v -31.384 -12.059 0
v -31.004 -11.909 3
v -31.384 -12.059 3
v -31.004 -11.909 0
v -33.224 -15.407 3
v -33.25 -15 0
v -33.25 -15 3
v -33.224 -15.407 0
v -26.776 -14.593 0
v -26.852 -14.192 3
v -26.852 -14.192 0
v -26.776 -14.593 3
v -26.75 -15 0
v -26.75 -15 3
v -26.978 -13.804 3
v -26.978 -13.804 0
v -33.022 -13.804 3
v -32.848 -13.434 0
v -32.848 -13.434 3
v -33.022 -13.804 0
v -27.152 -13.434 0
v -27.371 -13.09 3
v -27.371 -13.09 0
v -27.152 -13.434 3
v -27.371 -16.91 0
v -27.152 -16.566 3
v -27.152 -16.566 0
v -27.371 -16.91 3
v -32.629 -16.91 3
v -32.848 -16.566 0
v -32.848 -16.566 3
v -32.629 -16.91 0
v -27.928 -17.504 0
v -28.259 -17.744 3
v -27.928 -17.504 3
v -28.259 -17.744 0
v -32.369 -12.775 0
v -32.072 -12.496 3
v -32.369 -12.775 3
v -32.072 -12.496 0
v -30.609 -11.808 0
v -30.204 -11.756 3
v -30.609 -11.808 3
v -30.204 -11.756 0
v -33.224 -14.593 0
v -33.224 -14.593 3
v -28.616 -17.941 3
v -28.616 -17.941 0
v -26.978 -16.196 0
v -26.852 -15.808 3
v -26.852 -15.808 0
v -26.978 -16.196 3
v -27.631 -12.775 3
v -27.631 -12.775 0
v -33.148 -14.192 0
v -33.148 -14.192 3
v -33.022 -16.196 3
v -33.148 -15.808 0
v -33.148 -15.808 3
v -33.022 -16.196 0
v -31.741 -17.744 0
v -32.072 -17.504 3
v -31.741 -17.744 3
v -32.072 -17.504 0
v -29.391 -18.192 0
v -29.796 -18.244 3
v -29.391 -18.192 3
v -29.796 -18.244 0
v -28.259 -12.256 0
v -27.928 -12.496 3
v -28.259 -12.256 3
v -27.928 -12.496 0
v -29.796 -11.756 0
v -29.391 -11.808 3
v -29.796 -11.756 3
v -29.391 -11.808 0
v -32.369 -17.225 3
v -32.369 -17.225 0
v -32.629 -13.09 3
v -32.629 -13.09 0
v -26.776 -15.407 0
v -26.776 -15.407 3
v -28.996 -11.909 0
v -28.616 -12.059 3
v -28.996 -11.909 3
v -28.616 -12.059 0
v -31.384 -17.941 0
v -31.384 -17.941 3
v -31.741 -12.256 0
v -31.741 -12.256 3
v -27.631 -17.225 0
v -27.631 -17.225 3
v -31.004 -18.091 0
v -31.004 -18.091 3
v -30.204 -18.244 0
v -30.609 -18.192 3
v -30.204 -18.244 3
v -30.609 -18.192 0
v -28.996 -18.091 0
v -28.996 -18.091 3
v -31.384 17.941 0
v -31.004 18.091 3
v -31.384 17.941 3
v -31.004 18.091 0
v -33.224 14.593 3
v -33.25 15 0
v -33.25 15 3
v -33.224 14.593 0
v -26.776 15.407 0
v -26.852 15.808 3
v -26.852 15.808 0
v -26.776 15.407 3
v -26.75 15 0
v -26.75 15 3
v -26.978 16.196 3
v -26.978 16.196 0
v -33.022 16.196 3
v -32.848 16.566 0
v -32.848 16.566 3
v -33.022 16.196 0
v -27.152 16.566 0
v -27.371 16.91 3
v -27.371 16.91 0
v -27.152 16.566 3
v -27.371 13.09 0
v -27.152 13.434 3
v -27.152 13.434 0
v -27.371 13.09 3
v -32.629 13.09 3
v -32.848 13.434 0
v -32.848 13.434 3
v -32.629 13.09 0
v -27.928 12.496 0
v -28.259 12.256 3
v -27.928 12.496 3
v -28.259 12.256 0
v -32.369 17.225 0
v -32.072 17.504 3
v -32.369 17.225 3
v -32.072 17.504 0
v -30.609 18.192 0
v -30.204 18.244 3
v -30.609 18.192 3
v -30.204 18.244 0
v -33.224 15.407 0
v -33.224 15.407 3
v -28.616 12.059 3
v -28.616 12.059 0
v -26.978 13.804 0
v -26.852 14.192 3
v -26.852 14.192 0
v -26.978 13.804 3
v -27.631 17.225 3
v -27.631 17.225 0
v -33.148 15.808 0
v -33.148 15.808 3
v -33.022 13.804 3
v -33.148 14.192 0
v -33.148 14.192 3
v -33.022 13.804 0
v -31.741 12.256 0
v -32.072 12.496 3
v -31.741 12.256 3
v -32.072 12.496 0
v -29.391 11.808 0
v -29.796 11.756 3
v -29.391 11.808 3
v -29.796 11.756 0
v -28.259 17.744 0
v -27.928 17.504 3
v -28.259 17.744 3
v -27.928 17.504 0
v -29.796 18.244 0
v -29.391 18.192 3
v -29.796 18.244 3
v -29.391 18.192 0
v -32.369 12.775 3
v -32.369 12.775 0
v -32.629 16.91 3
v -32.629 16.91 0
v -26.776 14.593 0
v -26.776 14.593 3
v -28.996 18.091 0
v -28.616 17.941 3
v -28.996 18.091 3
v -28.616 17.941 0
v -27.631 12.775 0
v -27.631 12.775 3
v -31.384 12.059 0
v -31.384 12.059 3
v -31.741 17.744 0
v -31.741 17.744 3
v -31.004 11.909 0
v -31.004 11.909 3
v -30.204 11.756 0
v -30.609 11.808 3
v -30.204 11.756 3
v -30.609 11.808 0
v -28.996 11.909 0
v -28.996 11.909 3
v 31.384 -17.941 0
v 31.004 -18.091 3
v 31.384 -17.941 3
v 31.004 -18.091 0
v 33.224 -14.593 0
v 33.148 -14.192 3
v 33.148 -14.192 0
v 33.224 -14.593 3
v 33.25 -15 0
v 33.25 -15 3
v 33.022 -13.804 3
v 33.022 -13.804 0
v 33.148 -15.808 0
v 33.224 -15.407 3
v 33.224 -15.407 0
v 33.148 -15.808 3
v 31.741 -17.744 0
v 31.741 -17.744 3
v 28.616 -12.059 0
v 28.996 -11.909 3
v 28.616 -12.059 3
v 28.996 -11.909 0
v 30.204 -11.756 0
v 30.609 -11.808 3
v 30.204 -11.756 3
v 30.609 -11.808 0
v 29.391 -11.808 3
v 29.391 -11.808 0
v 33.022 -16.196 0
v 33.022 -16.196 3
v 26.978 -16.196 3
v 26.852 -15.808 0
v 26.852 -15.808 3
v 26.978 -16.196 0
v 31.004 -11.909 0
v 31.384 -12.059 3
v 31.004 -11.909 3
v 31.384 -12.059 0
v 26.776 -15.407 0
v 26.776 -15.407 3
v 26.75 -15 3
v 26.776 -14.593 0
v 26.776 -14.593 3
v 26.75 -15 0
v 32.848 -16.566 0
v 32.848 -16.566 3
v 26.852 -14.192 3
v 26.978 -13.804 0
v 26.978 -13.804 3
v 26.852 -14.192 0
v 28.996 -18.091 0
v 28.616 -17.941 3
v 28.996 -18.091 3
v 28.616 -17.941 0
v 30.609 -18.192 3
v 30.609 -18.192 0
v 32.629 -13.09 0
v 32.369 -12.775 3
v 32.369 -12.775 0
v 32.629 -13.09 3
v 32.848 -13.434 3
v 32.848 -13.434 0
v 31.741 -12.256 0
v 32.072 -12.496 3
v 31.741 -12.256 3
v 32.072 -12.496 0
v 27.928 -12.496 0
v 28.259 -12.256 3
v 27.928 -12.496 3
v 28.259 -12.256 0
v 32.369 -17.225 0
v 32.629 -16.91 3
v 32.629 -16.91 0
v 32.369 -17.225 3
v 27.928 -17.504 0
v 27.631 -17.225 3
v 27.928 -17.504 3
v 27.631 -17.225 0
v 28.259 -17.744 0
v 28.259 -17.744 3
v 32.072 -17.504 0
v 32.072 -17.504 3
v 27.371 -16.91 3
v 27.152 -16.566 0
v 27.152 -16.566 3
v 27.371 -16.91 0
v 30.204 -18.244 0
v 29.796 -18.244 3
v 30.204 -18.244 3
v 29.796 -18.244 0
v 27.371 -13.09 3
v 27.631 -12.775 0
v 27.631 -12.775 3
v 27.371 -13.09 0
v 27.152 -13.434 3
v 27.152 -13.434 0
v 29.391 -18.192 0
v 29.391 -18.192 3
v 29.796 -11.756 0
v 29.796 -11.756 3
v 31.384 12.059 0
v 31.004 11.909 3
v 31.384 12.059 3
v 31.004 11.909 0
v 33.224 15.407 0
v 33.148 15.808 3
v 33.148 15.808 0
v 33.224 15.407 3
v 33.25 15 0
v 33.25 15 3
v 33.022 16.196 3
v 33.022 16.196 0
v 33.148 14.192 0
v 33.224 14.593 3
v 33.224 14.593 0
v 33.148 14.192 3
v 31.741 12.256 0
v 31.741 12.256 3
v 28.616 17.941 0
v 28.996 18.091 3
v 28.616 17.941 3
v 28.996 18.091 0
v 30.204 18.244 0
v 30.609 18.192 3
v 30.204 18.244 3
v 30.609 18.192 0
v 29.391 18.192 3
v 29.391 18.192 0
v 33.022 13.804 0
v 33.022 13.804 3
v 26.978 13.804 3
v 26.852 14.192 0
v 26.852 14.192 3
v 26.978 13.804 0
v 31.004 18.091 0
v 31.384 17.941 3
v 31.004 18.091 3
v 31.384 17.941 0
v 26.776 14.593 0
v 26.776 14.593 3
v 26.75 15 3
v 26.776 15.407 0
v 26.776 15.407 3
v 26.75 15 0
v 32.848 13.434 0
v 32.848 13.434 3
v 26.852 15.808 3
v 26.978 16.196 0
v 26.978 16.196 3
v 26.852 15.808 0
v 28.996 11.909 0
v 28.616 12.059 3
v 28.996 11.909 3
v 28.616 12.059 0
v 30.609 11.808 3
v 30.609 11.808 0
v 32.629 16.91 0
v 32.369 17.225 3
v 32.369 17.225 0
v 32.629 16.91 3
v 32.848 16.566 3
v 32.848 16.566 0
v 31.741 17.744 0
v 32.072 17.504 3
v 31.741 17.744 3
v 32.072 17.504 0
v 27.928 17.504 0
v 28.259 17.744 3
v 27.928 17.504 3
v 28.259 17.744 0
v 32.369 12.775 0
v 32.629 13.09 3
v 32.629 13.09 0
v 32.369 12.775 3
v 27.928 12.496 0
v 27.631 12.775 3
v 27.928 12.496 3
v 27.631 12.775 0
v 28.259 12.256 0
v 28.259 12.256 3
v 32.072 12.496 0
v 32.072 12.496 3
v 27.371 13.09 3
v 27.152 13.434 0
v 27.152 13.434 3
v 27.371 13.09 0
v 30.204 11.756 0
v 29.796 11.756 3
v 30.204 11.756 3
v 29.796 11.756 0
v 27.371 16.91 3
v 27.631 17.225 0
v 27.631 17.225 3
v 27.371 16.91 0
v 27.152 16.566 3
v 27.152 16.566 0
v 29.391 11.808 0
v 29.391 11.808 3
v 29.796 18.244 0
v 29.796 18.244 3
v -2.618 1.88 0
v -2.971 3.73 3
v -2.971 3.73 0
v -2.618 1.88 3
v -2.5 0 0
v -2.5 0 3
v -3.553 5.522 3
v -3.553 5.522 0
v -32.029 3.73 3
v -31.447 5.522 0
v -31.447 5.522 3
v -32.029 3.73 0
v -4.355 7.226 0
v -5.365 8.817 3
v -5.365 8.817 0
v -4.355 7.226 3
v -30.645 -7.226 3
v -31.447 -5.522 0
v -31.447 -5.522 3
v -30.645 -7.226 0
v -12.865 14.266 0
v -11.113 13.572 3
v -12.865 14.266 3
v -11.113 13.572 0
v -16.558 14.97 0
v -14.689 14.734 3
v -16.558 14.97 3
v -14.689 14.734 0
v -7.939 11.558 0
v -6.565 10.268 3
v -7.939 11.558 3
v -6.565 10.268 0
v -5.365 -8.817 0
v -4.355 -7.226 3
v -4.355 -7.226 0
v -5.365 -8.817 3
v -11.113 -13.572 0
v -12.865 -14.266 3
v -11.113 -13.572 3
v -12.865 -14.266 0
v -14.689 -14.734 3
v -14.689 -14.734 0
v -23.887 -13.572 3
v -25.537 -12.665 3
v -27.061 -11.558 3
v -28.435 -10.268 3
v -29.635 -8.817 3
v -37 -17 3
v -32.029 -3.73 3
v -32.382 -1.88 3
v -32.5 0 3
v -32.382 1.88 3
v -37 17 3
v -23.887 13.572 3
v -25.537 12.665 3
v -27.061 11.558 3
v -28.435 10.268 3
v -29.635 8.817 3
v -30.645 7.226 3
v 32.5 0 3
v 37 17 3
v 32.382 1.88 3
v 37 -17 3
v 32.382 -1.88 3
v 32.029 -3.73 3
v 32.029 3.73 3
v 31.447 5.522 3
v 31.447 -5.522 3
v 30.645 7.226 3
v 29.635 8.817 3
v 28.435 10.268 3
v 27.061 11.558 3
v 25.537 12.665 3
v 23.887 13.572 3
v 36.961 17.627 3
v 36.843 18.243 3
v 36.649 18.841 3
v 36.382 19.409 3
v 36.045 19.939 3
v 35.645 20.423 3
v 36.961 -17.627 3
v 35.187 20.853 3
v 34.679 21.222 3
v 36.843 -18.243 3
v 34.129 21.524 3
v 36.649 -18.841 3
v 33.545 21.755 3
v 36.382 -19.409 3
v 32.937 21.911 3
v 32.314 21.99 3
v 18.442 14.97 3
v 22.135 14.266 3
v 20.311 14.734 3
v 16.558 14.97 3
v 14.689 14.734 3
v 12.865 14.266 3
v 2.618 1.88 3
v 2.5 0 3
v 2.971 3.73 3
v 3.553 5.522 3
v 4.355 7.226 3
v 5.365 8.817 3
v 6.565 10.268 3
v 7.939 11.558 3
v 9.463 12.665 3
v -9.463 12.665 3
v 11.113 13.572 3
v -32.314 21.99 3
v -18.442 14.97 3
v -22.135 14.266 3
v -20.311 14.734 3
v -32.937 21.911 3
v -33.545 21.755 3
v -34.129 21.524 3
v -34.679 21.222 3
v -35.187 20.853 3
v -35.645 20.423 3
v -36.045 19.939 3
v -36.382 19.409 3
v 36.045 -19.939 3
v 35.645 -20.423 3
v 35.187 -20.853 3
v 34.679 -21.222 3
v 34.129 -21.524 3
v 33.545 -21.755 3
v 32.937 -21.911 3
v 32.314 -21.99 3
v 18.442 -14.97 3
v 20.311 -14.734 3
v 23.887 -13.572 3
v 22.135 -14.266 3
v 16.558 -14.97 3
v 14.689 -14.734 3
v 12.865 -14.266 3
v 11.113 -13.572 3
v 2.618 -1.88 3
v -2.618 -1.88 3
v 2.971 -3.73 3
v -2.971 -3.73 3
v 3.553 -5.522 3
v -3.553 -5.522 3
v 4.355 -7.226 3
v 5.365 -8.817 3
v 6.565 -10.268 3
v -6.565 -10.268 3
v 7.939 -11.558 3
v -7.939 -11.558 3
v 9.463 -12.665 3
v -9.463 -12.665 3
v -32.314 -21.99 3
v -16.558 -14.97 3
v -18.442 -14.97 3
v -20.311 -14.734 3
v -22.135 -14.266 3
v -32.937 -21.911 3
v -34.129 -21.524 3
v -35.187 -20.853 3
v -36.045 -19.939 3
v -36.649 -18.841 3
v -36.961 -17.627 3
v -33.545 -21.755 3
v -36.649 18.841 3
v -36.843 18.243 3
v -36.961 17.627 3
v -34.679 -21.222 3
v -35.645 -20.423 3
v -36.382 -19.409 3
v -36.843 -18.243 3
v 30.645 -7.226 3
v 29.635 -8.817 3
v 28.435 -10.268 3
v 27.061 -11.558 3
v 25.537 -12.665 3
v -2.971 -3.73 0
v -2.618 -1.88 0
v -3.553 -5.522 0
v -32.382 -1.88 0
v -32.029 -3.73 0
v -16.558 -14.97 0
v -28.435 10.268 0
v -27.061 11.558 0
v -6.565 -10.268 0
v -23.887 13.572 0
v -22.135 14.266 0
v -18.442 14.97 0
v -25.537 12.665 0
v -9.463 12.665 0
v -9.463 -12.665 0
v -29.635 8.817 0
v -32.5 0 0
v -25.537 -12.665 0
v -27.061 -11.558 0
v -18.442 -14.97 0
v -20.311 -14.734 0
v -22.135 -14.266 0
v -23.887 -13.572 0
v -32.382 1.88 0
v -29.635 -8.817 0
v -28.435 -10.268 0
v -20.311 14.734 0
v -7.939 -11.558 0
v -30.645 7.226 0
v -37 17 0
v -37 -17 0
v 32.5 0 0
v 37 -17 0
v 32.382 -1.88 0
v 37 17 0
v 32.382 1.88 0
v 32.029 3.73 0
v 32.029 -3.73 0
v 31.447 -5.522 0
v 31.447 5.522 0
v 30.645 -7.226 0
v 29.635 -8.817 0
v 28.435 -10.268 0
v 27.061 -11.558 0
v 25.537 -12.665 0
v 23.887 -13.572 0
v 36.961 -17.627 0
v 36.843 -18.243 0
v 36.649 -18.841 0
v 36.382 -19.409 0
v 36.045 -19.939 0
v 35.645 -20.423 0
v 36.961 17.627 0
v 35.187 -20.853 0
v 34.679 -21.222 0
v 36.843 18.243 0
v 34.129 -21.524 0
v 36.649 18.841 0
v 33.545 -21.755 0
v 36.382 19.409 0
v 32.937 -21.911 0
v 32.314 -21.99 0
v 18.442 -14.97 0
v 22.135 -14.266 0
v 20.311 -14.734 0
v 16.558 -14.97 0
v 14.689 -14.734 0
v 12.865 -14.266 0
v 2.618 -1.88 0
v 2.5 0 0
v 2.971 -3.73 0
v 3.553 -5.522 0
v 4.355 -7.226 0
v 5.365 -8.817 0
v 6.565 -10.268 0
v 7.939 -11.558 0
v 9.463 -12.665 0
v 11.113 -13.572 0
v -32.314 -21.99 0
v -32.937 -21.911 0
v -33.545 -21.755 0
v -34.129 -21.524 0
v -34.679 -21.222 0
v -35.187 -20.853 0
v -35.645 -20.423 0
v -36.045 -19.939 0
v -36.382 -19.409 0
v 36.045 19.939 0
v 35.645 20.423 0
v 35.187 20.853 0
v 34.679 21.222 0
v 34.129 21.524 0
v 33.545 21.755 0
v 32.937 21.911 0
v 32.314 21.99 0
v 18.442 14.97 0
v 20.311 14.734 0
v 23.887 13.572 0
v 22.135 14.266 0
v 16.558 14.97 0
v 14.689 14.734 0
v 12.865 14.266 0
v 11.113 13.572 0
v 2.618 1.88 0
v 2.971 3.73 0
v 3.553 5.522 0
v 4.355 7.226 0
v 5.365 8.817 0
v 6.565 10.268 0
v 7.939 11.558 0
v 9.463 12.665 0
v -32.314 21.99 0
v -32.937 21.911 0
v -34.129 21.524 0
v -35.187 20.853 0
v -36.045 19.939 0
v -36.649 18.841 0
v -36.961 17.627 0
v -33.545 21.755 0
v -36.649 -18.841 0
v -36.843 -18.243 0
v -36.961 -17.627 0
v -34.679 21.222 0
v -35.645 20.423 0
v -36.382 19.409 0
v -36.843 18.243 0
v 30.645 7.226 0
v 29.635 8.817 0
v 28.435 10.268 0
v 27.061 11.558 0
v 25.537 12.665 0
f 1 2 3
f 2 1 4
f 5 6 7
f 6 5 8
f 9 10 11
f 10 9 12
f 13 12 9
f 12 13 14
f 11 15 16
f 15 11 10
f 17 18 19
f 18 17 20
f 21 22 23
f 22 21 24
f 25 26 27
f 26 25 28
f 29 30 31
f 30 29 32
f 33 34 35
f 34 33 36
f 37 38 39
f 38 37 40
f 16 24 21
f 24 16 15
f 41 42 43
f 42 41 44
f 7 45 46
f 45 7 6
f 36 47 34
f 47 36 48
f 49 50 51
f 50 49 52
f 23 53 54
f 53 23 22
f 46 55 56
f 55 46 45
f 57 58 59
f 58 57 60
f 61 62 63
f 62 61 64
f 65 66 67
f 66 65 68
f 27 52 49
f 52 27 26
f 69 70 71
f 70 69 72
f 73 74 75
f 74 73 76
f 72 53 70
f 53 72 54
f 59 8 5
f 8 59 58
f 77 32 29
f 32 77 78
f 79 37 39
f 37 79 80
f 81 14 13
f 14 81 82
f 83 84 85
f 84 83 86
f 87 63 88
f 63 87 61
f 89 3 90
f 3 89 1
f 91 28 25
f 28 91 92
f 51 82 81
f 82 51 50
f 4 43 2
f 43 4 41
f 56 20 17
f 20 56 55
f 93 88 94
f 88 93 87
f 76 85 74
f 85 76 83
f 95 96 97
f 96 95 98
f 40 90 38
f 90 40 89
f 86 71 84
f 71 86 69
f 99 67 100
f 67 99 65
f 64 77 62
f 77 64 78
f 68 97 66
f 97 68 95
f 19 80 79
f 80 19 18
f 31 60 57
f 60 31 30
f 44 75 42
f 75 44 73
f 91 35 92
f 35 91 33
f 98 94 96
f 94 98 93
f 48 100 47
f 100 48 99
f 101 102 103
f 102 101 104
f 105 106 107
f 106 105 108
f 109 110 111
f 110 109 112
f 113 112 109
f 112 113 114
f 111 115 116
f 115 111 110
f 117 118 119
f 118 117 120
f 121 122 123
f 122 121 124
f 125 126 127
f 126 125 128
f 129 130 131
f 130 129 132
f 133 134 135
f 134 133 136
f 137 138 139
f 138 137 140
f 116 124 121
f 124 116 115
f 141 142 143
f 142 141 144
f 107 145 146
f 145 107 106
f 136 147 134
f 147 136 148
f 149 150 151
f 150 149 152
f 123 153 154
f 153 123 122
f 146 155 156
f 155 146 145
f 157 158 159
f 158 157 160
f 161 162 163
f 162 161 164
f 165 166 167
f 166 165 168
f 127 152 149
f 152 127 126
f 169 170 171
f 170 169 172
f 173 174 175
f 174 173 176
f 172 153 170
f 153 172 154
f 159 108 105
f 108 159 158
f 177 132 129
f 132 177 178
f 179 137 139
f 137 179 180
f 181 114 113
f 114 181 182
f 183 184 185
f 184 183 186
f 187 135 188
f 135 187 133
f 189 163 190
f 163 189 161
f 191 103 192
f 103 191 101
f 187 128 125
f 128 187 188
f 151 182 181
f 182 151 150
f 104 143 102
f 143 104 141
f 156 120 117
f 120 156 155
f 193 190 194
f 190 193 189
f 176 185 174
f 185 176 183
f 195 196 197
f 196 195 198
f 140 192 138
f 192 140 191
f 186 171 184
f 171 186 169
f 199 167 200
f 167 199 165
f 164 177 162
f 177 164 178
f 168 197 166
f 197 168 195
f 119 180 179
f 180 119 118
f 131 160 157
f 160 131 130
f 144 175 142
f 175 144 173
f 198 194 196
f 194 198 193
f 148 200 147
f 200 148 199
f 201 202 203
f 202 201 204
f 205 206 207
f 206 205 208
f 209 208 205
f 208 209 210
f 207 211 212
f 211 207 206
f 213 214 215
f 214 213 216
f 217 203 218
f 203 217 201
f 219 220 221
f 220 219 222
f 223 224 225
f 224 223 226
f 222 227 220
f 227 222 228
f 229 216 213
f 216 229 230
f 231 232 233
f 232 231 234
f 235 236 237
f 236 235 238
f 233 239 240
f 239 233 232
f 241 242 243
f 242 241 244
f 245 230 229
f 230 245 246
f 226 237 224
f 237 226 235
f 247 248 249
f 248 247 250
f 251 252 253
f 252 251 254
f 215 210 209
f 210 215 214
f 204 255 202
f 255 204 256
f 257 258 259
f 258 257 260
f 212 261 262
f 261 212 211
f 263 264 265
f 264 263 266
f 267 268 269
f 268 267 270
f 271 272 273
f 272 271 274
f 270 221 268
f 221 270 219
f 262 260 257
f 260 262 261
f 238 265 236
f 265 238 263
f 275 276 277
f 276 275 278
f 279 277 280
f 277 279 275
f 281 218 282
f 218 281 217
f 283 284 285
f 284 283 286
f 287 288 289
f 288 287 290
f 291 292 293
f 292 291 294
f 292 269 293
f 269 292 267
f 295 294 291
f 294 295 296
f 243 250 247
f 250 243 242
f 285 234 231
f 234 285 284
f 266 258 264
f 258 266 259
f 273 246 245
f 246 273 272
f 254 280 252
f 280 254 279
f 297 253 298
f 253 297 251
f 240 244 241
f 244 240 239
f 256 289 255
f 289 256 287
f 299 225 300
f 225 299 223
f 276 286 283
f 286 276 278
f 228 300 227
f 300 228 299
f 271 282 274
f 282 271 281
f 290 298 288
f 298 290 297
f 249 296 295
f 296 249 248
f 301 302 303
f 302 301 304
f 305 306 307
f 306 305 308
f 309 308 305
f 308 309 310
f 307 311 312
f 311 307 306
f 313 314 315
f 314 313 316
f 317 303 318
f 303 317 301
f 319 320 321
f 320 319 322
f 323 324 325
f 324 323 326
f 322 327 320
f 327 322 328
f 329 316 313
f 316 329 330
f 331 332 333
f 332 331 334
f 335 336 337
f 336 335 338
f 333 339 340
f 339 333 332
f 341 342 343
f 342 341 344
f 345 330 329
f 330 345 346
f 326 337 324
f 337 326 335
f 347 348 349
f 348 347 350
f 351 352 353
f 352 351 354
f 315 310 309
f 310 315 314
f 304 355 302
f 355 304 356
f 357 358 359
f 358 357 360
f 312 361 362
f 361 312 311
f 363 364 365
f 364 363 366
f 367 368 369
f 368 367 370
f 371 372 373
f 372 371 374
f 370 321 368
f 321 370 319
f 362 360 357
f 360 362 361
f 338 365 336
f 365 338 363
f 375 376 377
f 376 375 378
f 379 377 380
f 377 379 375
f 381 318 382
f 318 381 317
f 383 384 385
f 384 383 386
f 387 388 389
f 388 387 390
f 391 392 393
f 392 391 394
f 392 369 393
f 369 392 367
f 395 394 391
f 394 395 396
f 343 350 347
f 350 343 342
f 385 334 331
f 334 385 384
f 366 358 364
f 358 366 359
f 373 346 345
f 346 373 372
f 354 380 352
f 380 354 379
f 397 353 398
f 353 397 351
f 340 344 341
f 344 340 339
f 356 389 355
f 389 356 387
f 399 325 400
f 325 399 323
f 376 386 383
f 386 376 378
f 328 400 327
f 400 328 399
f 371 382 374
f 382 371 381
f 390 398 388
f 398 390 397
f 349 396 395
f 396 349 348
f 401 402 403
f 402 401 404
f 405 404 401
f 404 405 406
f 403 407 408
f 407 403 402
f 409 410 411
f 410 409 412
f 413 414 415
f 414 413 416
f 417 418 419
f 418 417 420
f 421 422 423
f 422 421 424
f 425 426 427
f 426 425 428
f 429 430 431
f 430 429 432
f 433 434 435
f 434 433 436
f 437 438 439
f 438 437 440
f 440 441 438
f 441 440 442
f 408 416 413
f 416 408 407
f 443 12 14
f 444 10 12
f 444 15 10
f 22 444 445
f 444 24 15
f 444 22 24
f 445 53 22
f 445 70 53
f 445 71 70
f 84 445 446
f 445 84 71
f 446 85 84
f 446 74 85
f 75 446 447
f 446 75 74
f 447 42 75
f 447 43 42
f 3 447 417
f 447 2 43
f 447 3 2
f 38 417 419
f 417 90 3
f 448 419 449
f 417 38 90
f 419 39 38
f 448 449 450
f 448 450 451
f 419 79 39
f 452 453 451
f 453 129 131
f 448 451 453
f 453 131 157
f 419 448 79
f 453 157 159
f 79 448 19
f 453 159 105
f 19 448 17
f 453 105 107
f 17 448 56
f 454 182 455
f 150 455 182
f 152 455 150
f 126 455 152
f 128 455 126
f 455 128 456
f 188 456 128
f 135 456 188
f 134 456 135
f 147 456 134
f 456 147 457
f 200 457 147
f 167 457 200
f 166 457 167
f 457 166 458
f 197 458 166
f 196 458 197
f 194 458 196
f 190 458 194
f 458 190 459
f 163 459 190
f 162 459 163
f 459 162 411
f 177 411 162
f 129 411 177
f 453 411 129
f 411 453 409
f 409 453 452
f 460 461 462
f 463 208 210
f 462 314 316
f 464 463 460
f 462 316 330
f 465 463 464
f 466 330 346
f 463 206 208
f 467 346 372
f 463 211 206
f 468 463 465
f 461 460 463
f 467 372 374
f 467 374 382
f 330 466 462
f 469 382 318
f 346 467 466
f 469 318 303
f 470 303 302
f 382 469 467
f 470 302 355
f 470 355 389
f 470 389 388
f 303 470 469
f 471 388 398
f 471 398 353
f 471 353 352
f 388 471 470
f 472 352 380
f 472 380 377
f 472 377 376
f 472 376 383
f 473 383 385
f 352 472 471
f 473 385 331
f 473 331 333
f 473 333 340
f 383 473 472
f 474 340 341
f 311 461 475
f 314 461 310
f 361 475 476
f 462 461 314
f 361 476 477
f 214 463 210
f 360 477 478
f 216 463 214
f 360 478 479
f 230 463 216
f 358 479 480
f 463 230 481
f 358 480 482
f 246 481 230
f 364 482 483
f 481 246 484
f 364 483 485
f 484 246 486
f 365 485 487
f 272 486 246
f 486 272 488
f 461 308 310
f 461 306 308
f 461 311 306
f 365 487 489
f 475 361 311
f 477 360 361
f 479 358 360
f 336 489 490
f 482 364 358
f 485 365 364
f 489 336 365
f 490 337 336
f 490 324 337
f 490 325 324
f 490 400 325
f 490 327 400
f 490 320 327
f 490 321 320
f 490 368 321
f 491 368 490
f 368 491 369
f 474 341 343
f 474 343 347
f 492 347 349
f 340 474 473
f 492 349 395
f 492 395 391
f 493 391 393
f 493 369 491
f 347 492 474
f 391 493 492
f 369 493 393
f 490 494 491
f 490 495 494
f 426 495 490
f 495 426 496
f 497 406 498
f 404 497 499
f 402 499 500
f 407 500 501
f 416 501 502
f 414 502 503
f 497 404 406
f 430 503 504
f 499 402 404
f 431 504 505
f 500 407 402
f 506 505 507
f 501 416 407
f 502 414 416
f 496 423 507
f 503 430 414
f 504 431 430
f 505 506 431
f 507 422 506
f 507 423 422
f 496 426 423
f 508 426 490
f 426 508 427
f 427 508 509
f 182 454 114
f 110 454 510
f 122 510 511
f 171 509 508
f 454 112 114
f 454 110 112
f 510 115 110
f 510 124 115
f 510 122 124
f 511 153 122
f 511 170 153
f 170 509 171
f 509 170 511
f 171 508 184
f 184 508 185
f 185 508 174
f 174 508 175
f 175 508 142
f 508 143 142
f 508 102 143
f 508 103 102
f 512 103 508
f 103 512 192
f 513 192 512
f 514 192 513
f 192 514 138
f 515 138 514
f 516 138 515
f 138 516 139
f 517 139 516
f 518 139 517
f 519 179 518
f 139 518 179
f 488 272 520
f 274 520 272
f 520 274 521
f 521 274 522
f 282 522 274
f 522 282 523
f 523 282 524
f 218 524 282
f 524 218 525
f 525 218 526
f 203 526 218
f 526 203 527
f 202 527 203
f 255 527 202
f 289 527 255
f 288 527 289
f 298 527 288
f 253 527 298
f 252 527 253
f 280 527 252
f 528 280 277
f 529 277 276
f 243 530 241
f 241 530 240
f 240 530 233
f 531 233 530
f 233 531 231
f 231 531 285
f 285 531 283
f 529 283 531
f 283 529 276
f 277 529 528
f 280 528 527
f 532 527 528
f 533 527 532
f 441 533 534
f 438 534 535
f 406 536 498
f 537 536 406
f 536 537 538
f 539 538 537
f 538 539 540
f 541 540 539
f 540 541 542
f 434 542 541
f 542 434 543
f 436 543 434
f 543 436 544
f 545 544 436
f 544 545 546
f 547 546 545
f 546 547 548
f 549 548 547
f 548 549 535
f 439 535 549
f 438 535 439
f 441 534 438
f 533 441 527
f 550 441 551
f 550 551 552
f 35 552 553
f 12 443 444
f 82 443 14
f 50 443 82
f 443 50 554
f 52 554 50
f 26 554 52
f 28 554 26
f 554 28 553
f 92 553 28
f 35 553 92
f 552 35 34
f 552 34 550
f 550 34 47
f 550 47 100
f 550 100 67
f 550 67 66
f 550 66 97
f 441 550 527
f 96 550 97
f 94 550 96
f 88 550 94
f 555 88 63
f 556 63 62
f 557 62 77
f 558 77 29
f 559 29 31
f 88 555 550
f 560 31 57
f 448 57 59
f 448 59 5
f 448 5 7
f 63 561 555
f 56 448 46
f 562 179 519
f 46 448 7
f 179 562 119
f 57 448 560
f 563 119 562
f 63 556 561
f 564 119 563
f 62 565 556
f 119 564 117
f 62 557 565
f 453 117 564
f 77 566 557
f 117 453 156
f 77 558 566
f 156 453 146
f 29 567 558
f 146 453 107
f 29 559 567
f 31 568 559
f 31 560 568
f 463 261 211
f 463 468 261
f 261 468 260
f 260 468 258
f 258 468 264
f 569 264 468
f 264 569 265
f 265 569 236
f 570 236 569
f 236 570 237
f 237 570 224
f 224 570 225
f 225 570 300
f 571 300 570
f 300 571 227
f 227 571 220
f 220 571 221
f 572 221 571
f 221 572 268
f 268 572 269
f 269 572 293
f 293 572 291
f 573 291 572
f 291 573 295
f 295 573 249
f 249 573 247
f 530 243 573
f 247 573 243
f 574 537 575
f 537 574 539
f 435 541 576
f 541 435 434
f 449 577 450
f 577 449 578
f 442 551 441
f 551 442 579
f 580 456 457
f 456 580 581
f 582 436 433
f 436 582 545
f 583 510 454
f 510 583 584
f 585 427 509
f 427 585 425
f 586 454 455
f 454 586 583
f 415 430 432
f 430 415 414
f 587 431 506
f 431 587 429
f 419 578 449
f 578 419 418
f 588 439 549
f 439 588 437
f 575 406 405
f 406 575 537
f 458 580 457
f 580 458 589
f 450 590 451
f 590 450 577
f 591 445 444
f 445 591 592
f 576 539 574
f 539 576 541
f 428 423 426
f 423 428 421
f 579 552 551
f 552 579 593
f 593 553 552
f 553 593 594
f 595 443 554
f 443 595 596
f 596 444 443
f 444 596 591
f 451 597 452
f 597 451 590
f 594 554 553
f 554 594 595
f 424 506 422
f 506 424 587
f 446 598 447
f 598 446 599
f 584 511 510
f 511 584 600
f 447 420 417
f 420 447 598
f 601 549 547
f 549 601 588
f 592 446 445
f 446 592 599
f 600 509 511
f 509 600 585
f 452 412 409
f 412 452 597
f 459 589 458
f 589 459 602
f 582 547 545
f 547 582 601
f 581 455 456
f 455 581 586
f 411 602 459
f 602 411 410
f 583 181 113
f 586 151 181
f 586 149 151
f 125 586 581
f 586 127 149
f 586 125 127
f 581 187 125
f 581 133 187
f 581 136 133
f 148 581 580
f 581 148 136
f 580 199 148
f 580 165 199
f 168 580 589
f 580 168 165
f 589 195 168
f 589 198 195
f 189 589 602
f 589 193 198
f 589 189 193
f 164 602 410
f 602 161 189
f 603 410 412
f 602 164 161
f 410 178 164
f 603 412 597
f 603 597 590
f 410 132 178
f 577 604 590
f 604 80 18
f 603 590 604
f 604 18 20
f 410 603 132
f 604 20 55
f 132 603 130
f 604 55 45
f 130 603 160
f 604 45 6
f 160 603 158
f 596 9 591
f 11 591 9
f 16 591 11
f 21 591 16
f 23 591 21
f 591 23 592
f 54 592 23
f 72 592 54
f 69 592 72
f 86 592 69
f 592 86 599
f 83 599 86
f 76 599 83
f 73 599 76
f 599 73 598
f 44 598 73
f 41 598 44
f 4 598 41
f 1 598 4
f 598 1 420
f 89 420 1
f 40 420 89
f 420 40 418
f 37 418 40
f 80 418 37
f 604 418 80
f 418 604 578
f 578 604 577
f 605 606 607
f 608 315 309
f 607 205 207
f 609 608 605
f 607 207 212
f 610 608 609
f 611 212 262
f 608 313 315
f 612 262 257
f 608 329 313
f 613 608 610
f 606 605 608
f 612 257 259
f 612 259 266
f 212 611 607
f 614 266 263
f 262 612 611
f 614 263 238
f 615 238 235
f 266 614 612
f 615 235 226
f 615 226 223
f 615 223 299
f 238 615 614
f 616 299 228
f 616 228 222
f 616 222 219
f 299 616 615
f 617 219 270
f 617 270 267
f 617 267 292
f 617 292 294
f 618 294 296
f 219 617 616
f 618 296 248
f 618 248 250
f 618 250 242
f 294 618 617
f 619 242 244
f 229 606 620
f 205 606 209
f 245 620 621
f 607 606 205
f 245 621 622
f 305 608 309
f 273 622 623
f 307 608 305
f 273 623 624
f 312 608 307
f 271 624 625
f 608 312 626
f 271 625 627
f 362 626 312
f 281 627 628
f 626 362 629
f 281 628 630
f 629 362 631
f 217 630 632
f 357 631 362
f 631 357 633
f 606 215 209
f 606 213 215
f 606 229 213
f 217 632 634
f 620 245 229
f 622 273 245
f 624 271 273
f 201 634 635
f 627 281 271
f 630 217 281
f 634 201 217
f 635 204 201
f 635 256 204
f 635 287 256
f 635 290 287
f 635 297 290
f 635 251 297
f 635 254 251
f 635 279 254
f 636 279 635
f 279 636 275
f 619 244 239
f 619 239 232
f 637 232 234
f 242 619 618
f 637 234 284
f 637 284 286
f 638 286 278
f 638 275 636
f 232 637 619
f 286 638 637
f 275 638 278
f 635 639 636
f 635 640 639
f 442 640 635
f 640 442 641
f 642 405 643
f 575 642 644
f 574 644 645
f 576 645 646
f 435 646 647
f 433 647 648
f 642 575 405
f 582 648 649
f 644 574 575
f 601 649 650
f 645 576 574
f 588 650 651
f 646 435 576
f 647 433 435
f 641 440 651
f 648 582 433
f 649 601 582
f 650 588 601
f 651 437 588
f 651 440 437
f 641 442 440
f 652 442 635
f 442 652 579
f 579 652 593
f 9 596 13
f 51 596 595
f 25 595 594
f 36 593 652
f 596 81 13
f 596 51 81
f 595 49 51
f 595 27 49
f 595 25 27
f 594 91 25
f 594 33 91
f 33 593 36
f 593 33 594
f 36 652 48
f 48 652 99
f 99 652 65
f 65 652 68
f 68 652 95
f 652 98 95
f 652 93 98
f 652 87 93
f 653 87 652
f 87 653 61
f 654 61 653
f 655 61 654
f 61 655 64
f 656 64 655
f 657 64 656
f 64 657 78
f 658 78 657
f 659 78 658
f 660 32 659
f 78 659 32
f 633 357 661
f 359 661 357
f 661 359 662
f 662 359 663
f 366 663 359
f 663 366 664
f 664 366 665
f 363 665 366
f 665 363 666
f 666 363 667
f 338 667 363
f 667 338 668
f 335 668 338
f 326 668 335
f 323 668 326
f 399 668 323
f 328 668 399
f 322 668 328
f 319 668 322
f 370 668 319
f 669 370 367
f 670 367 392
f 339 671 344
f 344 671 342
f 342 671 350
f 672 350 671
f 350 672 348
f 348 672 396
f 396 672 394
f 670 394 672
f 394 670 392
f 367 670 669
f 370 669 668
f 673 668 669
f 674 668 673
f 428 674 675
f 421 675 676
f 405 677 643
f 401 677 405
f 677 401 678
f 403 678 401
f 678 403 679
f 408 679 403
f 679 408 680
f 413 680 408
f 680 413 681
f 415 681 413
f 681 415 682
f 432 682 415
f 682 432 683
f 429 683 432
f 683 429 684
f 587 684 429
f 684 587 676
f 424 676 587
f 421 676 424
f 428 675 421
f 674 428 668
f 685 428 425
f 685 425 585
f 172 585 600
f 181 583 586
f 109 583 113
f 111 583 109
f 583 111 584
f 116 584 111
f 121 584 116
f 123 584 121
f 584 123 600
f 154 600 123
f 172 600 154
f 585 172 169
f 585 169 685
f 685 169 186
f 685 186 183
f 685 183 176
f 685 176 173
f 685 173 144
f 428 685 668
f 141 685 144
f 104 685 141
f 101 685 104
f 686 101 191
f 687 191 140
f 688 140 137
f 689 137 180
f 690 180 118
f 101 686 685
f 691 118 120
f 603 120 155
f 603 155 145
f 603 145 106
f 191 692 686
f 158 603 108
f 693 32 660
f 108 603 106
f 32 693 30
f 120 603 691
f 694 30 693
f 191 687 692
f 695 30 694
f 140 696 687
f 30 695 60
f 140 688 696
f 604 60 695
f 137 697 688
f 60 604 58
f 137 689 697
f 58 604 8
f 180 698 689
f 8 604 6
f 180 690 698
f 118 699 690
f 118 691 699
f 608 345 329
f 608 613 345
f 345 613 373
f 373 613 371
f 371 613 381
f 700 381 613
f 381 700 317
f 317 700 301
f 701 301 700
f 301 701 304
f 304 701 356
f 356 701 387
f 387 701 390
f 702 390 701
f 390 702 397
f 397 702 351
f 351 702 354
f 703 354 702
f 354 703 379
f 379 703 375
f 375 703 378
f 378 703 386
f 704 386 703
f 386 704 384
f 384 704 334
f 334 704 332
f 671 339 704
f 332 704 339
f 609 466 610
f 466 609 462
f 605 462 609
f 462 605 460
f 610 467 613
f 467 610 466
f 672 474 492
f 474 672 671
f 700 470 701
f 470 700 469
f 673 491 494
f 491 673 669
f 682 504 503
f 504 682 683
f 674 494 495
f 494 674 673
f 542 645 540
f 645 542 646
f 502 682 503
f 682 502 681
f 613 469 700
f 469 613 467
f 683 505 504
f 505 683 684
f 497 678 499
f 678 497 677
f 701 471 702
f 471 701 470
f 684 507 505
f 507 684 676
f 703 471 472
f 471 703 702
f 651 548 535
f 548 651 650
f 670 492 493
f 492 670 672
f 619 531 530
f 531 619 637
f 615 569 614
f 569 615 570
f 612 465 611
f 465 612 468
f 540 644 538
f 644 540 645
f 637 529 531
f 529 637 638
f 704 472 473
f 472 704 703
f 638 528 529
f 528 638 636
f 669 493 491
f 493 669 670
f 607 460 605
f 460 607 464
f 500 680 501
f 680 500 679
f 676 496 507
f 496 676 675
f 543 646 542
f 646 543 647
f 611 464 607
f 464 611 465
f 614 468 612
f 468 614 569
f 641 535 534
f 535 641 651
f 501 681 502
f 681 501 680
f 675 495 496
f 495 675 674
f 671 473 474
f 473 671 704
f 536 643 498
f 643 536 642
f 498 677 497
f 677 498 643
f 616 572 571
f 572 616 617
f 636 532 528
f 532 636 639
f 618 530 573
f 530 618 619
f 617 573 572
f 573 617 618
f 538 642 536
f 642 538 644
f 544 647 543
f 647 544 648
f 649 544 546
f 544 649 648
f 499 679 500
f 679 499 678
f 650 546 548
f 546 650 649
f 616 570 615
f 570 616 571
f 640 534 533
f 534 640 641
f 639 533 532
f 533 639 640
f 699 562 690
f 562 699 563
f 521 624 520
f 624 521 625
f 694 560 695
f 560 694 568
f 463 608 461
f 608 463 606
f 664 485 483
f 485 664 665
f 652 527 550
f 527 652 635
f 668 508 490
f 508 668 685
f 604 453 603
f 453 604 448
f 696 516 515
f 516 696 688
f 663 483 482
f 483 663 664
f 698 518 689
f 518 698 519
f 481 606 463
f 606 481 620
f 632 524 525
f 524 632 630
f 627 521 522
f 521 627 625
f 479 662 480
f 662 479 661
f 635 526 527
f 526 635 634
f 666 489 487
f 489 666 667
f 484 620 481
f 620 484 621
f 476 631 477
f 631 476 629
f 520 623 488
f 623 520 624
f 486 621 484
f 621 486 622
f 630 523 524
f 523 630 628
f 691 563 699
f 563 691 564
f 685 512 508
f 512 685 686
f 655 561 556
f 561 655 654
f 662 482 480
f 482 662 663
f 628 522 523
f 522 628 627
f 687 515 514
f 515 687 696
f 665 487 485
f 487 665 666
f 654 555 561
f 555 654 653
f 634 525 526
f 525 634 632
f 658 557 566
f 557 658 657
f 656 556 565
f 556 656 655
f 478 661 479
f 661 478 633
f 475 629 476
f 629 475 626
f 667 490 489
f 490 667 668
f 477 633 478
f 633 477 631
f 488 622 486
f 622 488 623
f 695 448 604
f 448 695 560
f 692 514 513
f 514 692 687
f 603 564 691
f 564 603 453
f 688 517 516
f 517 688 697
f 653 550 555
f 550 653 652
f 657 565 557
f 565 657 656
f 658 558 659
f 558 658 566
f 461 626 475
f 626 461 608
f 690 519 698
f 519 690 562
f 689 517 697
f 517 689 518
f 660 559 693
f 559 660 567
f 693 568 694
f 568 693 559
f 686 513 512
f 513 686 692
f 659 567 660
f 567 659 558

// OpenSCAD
$fn = 50;

difference() {
	union() {
		hull() {
			translate(v = [-32.0, 17.0, 0]) {
				cylinder(h = 3, r = 5);
			}
			translate(v = [32.0, 17.0, 0]) {
				cylinder(h = 3, r = 5);
			}
			translate(v = [-32.0, -17.0, 0]) {
				cylinder(h = 3, r = 5);
			}
			translate(v = [32.0, -17.0, 0]) {
				cylinder(h = 3, r = 5);
			}
		}
	}
	union() {
		translate(v = [-30.0, -15.0, -100.0]) {
			cylinder(h = 200, r = 3.25);
		}
		translate(v = [-30.0, 15.0, -100.0]) {
			cylinder(h = 200, r = 3.25);
		}
		translate(v = [30.0, -15.0, -100.0]) {
			cylinder(h = 200, r = 3.25);
		}
		translate(v = [30.0, 15.0, -100.0]) {
			cylinder(h = 200, r = 3.25);
		}
		translate(v = [-30.0, -15.0, -100.0]) {
			cylinder(h = 200, r = 1.8);
		}
		translate(v = [-30.0, 15.0, -100.0]) {
			cylinder(h = 200, r = 1.8);
		}
		translate(v = [30.0, -15.0, -100.0]) {
			cylinder(h = 200, r = 1.8);
		}
		translate(v = [30.0, 15.0, -100.0]) {
			cylinder(h = 200, r = 1.8);
		}
		translate(v = [-17.5, 0, 0.0]) {
			cylinder(h = 3, r = 15.0);
		}
		translate(v = [17.5, 0, 0.0]) {
			cylinder(h = 3, r = 15.0);
		}
	}
}
